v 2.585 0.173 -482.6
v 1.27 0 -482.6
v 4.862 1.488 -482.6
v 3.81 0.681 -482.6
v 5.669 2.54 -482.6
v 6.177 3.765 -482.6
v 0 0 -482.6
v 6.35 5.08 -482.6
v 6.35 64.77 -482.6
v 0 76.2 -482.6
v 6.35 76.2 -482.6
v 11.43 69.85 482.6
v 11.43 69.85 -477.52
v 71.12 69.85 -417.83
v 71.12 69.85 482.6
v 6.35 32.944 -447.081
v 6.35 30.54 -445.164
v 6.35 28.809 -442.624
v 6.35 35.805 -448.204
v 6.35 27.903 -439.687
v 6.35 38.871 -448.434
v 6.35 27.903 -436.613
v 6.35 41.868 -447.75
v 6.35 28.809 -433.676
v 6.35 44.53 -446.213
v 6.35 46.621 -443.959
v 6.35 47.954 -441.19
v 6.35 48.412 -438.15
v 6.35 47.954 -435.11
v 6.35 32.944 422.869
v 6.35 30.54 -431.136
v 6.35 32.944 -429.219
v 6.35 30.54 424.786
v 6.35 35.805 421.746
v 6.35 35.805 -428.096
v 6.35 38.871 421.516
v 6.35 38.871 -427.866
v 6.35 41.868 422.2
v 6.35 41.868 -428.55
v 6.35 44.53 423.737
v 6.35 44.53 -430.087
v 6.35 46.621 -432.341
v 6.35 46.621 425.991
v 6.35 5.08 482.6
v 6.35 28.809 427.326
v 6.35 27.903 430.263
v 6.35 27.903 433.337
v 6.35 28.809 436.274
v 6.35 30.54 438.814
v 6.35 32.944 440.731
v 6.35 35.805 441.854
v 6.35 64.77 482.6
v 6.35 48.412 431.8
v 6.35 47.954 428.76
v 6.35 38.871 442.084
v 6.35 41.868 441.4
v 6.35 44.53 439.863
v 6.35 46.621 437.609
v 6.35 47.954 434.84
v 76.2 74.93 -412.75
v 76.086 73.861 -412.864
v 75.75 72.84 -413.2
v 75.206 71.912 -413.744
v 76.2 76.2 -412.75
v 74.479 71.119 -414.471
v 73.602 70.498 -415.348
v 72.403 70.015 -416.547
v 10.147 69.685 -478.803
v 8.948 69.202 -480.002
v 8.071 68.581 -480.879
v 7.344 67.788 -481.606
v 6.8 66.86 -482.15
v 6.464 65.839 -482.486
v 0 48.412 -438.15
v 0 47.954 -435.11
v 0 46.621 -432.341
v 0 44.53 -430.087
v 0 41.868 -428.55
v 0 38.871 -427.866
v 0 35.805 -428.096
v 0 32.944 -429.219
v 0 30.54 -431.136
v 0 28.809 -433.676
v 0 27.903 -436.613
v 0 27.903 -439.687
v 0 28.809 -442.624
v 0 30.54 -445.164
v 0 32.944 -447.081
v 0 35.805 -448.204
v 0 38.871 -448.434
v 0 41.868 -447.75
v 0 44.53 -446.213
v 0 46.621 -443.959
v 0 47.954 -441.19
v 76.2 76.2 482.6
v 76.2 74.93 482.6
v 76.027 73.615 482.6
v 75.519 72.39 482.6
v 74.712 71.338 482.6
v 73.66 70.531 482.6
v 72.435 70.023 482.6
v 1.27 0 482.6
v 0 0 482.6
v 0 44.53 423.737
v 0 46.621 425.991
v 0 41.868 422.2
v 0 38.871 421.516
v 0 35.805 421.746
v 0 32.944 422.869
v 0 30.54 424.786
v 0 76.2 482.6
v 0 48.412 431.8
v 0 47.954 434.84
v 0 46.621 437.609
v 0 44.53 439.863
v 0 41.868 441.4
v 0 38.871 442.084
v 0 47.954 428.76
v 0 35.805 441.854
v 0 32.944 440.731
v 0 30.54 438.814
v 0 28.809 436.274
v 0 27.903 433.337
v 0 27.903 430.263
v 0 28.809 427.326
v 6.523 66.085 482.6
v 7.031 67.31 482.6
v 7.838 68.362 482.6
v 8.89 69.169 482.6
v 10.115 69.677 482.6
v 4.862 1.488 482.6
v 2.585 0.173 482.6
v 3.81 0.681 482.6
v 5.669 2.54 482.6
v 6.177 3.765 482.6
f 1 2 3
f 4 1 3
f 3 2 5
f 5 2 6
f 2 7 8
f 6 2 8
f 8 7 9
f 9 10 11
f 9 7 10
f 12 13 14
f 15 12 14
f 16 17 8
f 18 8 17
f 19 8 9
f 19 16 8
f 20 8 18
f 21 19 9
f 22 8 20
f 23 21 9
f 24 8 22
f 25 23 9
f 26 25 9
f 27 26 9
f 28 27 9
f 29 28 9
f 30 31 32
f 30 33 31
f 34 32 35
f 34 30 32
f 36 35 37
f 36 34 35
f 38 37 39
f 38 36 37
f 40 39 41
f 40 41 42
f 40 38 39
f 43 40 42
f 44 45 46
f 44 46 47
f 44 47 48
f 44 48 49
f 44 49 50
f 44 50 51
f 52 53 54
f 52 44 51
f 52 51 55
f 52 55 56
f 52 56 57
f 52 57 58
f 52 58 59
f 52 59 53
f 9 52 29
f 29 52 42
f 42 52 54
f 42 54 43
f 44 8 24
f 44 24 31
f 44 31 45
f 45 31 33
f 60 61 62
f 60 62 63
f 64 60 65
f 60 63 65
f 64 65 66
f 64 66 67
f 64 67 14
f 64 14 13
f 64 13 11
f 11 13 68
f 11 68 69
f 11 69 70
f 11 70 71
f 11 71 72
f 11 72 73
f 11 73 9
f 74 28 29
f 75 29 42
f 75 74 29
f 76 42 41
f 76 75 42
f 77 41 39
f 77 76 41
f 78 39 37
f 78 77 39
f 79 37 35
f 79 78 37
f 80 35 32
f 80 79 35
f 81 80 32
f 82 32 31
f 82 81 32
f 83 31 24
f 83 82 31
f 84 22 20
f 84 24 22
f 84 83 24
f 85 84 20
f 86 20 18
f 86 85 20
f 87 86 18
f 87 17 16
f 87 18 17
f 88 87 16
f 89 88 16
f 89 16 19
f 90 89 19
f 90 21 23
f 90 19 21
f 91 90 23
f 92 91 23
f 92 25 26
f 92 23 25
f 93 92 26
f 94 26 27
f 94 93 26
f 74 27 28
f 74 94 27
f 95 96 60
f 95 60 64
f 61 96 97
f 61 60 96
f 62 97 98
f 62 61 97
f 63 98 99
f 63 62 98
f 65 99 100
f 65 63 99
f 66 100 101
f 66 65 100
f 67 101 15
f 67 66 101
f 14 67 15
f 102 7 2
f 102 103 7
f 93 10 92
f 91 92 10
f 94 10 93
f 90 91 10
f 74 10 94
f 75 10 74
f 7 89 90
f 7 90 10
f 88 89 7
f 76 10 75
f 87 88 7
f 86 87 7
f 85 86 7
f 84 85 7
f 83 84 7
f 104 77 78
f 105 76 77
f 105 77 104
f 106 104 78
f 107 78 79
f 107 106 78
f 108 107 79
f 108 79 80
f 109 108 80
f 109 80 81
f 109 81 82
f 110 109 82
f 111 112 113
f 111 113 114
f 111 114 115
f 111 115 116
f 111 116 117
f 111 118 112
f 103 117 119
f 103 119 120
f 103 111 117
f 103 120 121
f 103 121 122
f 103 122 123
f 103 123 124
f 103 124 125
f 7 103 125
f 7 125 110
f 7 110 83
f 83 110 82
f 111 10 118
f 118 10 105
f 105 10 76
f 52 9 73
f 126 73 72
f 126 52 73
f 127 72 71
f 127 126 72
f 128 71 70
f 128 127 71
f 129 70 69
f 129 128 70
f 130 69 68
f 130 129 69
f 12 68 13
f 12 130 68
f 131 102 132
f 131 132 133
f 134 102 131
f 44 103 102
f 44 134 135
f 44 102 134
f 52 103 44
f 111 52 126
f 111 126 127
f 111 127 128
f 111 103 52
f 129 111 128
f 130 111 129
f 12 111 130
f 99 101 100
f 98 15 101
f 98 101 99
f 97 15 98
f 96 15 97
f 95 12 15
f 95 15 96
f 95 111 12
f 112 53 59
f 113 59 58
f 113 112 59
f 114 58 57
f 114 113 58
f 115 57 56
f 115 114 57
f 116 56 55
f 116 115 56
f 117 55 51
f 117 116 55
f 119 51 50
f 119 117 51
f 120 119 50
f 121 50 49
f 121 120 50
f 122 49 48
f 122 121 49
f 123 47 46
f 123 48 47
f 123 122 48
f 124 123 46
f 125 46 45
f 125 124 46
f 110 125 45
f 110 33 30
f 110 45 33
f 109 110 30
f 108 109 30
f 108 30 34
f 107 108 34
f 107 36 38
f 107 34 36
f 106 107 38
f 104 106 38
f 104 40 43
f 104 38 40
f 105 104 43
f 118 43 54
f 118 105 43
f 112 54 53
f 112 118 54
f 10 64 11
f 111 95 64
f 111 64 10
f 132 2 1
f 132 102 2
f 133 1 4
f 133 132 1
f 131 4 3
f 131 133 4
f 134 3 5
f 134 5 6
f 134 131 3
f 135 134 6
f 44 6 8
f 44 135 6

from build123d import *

# Parameters (mm, degrees)
F1_DEPTH = 482.6
F3_DEPTH = 76.201
F4_R     = 10.3124
F5_DEPTH = 76.201
F6_R     = 5.08


with BuildPart() as f1:
    # F0 (on Top) → F1 (new body, symmetric)
    with BuildSketch(Plane.XY):
        Polygon((0, 76.2), (0, 0), (6.35, 0), (6.35, 69.85), (76.2, 69.85), (76.2, 76.2), align=None)
    extrude(amount=F1_DEPTH, both=True)

    # F2 (on Front) → F3 (cut, through all)
    with BuildSketch(Plane.XZ):
        Polygon((84.518964, -404.431036), (6.35, -482.6), (84.518964, -482.6), align=None)
    extrude(amount=-F3_DEPTH, mode=Mode.SUBTRACT)

    # F4 (on Right) → F5 (cut, through all)
    with BuildSketch(Plane.YZ):
        with Locations((38.1, -438.15)):
            Circle(F4_R)
        with Locations((38.1, 431.8)):
            Circle(F4_R)
    extrude(amount=F5_DEPTH, mode=Mode.SUBTRACT)

    # F6
    f6_edges = [f1.edges().sort_by_distance(p)[0] for p in [
        (6.35, 69.85, 0),
        (76.2, 69.85, 34.925),
        (6.35, 0, 0),
    ]]
    fillet(f6_edges, radius=F6_R)


solid = f1.part
